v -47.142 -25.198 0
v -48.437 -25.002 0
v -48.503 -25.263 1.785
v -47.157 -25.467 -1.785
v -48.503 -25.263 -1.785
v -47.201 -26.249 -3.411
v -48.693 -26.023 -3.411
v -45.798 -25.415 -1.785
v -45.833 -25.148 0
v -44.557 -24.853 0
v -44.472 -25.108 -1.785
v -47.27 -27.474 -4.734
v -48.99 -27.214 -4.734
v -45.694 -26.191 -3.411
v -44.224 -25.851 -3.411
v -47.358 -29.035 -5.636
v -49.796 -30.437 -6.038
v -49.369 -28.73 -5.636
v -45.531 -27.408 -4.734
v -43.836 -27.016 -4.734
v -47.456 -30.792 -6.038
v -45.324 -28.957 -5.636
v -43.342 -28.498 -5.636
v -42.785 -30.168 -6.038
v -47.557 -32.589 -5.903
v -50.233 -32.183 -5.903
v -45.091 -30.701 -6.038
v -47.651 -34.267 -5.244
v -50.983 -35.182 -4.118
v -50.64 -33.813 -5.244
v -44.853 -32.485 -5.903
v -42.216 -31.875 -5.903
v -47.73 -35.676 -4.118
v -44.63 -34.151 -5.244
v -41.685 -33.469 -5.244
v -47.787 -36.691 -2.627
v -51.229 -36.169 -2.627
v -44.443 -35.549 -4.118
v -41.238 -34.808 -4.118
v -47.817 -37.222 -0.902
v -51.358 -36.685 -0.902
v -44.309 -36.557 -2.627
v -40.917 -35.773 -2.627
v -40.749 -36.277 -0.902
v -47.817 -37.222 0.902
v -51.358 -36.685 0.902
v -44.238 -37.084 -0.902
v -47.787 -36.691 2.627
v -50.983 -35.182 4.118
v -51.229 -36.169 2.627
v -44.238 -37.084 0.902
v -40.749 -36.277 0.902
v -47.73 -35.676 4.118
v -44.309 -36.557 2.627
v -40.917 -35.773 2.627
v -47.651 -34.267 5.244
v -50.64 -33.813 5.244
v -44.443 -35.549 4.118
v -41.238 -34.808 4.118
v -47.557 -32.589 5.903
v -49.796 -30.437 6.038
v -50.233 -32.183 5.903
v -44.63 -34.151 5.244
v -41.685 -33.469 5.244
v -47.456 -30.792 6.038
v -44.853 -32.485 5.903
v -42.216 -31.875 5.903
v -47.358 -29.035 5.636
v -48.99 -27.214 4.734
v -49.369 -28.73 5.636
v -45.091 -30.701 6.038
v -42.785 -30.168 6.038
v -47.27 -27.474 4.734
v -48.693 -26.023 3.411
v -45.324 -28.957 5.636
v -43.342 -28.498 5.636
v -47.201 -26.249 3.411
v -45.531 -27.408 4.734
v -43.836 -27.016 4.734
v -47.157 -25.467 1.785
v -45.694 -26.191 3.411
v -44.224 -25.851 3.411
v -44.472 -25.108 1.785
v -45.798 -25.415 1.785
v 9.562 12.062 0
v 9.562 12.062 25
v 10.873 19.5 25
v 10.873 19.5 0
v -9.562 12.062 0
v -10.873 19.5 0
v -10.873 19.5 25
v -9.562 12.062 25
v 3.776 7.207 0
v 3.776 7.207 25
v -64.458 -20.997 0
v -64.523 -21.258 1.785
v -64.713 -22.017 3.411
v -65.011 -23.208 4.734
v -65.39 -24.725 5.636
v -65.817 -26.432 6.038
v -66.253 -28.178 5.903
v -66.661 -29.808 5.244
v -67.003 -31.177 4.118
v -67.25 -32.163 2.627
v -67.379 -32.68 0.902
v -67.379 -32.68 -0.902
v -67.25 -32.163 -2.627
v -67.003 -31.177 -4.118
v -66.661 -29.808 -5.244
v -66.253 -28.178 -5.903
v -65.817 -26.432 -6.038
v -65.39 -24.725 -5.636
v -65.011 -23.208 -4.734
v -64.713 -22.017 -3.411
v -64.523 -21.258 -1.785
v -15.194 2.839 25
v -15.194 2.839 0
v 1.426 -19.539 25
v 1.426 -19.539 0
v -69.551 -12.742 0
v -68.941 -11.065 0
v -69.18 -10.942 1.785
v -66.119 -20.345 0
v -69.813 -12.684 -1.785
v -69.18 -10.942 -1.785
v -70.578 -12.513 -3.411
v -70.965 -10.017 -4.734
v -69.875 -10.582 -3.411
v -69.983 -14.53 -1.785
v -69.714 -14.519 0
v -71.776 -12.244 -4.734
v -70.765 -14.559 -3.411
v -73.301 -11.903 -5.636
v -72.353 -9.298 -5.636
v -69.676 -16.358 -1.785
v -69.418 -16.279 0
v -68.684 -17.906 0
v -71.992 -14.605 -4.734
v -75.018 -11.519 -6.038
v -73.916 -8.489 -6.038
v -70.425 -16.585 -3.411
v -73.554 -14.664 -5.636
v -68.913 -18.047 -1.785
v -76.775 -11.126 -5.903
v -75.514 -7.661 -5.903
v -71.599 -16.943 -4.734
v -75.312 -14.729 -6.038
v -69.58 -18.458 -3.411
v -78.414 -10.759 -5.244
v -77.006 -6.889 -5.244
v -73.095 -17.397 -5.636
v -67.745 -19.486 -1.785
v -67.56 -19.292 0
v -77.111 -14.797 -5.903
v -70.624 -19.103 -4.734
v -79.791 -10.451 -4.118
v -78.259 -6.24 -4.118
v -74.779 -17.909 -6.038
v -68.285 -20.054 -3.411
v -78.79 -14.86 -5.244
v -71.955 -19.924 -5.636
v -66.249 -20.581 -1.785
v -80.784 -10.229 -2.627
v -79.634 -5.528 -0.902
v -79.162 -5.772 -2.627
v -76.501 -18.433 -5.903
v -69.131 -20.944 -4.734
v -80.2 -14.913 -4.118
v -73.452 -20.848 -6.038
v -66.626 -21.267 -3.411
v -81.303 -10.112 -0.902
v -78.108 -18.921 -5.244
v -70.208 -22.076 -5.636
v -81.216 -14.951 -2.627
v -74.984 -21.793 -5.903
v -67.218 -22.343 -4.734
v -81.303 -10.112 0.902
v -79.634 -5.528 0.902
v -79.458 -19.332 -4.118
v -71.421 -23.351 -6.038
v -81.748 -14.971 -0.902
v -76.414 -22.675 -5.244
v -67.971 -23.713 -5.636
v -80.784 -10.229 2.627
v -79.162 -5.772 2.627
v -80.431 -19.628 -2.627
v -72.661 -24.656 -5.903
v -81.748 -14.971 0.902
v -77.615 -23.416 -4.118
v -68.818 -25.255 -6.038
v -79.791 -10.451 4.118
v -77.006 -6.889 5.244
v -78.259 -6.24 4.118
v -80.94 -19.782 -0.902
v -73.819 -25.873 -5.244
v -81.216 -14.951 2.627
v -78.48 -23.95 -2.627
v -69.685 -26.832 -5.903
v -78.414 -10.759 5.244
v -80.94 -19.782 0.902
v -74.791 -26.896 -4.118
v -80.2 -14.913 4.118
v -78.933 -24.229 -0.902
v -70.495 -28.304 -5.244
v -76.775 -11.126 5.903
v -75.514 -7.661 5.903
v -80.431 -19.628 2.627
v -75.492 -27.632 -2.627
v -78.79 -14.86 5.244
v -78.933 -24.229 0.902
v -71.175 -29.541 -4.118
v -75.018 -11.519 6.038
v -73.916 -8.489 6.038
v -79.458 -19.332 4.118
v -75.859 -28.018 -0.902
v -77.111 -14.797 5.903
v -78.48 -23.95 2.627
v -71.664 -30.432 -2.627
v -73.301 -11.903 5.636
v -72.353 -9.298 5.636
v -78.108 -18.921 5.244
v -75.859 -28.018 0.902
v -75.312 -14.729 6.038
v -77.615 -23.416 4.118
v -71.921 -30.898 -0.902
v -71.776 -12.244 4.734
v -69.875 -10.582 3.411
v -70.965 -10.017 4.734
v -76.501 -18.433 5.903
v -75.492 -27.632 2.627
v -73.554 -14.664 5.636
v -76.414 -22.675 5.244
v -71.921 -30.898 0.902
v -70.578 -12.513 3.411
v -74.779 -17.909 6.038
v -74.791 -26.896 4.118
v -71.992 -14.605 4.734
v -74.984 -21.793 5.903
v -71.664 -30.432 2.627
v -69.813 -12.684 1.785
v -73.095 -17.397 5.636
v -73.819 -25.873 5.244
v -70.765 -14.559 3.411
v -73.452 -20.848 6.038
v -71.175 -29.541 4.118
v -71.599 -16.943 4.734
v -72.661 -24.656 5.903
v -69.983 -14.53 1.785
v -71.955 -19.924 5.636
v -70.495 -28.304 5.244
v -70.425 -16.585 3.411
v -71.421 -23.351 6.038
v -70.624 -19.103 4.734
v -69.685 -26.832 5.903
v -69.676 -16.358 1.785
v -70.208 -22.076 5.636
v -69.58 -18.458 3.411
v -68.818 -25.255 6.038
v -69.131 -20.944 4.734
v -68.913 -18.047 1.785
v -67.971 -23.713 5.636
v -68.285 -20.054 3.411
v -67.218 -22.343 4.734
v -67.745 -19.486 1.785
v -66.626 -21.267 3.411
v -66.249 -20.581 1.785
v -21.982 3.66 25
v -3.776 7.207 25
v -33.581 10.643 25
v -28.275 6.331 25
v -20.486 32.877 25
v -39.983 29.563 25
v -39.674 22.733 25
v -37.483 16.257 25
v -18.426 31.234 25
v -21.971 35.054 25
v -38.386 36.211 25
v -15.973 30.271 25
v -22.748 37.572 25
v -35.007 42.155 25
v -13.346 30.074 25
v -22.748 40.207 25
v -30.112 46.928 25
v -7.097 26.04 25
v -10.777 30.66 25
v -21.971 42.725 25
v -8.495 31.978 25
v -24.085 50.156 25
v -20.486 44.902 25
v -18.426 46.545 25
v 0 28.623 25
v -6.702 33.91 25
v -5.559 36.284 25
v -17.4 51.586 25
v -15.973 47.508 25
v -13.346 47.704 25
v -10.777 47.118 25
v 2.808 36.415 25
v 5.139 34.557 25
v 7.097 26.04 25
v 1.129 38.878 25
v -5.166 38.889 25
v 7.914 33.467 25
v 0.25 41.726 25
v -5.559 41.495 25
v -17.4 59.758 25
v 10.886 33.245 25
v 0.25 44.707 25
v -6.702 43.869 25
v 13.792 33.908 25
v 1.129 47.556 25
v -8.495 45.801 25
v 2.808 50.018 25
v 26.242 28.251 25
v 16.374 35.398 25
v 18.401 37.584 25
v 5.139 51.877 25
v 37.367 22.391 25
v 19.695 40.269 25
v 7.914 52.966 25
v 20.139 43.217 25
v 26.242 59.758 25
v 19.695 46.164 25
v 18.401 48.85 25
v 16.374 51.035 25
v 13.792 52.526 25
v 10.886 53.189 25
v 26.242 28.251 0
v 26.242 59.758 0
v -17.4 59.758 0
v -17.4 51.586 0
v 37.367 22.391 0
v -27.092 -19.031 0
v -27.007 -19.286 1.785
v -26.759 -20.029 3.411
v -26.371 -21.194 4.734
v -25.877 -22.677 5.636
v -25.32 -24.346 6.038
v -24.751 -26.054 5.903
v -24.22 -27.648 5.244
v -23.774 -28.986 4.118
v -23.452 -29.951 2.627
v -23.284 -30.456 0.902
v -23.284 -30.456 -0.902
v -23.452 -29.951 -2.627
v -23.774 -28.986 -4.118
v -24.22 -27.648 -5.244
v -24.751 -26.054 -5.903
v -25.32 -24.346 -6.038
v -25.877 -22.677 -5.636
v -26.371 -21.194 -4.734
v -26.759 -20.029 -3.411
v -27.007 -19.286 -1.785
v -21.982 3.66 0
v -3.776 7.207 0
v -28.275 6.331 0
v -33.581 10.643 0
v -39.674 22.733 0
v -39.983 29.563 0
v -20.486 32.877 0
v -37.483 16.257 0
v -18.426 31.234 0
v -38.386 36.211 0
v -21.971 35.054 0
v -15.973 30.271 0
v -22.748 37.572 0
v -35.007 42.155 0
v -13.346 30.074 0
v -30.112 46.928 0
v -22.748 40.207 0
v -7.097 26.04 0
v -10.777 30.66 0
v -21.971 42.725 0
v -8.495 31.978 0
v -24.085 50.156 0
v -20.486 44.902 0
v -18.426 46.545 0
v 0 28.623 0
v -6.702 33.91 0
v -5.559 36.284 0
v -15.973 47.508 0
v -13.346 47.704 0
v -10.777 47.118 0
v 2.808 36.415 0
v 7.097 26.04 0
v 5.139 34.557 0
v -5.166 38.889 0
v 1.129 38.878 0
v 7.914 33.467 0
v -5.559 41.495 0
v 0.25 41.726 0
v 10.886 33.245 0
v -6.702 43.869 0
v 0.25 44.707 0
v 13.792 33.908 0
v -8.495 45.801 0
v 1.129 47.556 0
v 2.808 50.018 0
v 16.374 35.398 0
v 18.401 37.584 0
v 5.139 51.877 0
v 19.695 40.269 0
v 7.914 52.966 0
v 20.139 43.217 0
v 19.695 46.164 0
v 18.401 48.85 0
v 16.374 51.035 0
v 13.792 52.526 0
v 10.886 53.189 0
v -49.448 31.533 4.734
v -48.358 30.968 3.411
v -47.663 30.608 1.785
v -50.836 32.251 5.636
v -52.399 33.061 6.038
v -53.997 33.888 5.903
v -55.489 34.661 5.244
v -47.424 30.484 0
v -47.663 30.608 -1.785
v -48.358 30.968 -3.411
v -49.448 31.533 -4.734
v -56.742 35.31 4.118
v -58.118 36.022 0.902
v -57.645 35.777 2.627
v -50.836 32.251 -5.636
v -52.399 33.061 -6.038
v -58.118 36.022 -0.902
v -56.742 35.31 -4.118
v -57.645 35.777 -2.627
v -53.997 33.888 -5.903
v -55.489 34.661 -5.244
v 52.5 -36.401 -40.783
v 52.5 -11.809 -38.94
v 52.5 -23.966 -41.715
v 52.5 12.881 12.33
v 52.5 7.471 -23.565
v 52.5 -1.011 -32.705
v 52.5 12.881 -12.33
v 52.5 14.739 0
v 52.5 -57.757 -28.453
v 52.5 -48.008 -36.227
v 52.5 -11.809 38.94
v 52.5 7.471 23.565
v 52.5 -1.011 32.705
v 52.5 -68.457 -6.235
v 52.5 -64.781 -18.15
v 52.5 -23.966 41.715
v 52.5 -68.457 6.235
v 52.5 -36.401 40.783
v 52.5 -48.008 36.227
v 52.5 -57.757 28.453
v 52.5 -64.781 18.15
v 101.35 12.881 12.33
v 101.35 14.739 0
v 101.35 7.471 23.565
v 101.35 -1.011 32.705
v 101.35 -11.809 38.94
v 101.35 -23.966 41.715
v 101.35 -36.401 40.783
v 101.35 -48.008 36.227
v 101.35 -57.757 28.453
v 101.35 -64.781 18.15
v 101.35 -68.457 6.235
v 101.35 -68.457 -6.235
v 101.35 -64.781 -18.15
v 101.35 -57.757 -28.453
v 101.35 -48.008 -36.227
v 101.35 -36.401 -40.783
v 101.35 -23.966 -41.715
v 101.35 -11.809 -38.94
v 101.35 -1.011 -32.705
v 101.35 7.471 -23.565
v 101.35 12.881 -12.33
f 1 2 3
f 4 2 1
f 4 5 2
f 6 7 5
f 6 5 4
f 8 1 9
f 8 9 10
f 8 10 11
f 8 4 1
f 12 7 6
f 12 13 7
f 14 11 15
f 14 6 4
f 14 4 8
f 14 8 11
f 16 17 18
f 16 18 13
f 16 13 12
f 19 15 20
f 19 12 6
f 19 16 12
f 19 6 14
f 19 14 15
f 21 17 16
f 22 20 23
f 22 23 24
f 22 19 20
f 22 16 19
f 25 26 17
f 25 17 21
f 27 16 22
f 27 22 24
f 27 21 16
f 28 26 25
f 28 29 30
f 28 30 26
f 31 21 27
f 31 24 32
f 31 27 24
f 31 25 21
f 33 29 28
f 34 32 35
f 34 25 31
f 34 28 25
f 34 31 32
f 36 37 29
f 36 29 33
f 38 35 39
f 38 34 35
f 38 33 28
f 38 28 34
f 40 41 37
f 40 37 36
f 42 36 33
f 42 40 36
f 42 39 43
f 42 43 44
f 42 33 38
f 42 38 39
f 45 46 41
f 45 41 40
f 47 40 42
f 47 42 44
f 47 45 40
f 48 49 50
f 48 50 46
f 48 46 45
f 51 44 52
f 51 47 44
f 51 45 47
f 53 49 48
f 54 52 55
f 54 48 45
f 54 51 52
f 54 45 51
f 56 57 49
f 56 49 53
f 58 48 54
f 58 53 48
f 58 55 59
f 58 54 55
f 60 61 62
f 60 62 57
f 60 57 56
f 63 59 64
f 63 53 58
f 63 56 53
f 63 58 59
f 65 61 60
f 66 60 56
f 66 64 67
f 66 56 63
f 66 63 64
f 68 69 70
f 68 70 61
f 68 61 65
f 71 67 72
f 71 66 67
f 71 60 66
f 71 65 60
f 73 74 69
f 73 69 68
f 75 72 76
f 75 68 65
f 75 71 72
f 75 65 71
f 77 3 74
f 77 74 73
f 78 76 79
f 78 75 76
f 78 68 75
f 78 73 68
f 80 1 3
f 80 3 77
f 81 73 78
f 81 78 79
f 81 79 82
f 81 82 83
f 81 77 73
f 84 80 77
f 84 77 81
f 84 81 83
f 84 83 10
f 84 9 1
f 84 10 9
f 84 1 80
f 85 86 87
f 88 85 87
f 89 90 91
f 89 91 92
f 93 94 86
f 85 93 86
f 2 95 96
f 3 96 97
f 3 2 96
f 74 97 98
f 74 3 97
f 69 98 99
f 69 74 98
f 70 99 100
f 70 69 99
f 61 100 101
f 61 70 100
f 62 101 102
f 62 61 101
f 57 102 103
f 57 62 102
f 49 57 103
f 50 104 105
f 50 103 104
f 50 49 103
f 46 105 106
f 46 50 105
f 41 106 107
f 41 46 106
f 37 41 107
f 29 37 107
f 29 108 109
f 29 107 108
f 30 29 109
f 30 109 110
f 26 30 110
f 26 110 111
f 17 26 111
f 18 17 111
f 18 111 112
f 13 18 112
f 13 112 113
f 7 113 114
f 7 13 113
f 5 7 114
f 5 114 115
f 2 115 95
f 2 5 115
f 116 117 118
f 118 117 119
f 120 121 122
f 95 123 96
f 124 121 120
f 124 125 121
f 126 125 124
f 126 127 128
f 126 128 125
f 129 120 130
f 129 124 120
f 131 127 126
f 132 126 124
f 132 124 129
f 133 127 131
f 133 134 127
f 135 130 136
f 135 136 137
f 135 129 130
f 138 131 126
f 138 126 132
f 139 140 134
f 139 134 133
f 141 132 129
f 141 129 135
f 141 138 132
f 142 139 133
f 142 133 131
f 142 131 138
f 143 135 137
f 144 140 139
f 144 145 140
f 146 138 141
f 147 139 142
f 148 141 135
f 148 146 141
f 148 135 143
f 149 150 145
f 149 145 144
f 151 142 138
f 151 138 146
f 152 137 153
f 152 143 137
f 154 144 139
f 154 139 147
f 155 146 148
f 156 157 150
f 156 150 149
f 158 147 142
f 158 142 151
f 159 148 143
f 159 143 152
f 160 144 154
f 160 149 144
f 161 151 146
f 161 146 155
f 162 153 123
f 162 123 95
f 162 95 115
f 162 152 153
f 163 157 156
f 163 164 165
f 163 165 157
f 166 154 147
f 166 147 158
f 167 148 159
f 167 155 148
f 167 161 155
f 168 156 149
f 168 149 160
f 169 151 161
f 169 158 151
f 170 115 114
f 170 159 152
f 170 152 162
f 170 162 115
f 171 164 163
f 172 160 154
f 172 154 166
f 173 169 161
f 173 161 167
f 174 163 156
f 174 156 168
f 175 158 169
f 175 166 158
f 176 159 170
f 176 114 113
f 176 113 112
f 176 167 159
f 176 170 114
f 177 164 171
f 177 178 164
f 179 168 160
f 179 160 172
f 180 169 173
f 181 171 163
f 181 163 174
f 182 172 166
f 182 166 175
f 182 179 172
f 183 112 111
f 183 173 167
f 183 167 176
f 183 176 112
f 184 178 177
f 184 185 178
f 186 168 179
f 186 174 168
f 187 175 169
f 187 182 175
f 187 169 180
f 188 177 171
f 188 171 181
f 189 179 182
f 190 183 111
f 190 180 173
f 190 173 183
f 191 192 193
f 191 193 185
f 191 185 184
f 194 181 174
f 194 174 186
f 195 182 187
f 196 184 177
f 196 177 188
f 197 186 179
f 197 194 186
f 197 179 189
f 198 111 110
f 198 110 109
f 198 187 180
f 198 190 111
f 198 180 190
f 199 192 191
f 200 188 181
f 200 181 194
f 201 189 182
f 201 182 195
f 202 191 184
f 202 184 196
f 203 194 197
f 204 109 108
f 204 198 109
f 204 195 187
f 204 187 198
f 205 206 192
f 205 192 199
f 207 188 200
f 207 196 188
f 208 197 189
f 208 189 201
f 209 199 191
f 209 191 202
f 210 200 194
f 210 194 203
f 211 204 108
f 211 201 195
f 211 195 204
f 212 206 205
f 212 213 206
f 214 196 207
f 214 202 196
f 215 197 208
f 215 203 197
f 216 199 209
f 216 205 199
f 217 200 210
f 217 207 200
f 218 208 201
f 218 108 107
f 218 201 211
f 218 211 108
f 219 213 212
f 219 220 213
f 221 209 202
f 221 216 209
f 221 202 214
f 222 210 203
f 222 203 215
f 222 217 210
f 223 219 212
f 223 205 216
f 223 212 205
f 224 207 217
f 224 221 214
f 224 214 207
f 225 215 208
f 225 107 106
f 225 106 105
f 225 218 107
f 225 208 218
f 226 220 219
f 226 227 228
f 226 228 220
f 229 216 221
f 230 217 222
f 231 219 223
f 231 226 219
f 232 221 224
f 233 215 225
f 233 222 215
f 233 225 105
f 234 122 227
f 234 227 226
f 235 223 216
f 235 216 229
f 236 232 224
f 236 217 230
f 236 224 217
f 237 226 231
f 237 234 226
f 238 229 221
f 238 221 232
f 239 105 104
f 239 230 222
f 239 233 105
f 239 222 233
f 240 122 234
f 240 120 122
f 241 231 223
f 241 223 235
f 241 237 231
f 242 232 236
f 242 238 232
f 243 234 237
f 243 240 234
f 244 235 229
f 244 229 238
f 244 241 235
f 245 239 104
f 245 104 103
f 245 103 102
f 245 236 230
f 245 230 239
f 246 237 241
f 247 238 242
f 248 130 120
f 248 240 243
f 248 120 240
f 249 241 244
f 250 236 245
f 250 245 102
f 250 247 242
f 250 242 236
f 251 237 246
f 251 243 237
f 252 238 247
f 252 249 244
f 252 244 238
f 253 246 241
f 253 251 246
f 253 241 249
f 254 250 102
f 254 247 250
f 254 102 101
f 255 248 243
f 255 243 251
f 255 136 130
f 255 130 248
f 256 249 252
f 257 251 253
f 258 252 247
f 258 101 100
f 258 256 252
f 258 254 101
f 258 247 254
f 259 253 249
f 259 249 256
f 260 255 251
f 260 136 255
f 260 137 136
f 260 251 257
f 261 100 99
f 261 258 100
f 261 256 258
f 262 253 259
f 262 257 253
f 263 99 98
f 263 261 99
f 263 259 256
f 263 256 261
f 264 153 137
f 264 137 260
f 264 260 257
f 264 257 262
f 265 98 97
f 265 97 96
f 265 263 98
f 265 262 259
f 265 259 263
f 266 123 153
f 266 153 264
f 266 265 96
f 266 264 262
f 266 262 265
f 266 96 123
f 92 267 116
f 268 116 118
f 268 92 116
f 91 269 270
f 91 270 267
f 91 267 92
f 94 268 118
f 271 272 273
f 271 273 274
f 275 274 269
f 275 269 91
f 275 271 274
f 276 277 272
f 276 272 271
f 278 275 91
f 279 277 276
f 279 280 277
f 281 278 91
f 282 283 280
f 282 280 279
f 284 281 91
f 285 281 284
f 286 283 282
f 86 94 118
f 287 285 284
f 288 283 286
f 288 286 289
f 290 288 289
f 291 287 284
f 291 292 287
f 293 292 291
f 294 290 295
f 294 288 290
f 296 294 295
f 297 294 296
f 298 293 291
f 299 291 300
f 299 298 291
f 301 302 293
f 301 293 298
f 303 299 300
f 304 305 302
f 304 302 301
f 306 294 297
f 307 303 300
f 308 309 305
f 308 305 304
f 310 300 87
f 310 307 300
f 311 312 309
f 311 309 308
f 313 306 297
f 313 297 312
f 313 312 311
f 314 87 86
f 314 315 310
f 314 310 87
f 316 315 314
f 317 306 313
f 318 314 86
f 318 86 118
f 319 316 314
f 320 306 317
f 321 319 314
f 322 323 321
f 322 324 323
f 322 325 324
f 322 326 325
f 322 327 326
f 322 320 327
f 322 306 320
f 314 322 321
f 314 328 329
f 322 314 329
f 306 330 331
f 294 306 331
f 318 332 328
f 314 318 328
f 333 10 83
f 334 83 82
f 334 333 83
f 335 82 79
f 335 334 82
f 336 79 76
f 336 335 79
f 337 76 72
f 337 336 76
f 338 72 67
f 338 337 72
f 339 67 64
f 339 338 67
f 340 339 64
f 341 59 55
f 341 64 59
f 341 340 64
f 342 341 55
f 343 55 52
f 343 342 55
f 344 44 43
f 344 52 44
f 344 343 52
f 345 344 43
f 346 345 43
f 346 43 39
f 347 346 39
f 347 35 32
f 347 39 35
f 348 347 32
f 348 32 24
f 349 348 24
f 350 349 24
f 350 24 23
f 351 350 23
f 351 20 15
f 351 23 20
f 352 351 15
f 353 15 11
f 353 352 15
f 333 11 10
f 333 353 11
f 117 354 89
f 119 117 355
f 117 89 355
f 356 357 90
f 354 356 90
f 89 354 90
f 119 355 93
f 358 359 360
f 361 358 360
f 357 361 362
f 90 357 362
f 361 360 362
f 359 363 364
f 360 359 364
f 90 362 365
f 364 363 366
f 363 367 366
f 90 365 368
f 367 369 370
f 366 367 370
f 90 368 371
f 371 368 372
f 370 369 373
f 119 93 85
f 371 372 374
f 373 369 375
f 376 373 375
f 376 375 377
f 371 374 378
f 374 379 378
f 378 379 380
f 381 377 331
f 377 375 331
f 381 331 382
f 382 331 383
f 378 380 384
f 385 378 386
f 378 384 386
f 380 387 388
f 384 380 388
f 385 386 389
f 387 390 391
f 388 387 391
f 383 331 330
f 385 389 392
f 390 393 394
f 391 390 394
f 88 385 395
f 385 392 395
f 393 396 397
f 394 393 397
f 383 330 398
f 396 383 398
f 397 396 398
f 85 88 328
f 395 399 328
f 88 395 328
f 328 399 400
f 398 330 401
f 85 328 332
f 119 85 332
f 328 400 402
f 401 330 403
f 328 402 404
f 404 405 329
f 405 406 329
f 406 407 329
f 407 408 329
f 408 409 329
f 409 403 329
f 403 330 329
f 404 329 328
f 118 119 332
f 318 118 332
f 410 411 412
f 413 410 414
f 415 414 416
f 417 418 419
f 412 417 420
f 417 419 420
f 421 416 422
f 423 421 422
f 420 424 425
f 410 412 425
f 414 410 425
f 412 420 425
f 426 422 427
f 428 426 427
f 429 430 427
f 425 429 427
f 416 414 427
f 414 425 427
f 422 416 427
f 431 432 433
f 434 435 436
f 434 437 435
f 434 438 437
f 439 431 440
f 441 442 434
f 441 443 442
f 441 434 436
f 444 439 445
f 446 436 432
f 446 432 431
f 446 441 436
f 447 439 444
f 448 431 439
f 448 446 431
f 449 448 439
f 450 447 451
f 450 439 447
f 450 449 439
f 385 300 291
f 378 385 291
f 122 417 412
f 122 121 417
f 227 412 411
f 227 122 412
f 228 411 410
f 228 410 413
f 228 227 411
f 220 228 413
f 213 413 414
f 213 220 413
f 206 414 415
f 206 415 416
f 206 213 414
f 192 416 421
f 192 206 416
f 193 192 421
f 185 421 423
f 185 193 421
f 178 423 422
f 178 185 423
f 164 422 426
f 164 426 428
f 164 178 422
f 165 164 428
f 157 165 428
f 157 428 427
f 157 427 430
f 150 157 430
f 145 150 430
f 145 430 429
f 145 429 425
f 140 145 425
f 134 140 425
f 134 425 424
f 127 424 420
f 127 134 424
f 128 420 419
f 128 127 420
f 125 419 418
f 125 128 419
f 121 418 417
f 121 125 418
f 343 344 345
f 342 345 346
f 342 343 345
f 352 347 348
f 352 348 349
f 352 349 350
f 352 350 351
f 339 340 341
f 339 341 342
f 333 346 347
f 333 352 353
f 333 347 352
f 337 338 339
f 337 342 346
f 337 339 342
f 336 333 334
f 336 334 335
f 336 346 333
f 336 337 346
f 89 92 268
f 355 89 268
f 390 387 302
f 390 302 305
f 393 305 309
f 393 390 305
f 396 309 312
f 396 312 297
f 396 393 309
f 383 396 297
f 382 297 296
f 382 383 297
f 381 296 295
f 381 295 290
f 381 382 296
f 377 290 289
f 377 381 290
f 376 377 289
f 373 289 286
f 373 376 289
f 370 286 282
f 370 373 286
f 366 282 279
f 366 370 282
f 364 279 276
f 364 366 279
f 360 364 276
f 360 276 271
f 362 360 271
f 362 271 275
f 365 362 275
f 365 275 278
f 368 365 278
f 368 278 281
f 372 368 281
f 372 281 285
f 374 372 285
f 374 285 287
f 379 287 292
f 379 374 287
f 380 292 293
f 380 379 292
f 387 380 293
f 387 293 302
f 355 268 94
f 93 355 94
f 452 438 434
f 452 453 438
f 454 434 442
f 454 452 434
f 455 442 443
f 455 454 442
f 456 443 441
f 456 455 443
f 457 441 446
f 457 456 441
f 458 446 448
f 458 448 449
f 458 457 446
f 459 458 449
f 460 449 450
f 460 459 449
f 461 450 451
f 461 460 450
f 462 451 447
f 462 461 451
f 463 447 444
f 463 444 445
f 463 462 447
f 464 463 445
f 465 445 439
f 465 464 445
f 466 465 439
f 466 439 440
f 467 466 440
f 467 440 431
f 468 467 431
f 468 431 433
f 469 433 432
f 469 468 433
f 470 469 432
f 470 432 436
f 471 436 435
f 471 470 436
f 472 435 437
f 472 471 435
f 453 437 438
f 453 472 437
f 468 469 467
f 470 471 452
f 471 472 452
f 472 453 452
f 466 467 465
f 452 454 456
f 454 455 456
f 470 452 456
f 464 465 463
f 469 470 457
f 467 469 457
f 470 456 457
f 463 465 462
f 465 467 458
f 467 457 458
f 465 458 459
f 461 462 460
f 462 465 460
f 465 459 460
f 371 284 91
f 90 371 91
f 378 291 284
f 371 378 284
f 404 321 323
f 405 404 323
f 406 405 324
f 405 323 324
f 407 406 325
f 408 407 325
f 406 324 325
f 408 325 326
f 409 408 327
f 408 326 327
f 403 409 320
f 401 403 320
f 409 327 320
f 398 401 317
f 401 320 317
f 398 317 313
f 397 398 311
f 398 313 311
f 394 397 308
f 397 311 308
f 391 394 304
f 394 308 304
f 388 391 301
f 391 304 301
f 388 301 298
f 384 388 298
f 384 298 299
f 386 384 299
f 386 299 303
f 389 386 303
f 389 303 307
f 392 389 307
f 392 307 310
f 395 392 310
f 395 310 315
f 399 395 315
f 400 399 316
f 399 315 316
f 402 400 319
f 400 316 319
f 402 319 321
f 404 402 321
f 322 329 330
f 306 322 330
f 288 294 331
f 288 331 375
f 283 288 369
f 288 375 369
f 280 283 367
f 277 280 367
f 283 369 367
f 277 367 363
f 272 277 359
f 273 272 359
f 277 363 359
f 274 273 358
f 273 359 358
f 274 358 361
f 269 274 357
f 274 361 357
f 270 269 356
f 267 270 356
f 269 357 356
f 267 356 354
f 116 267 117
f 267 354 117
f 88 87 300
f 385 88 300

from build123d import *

# Parameters (mm, degrees)
F0_R      = 8.8399047294
F1_DEPTH  = 25
F2_R      = 10
F3_DEPTH  = 25
F4_W      = 48.8502793014
F4_H      = 41.8315539137
F8_R      = 6.0550618463
F10_DEPTH = 25


with BuildPart() as f1:
    # F0 (on Top) → F1 (new body)
    with BuildSketch(Plane.XY):
        with BuildLine():
            Line((37.3665243387, 22.3913900554), (26.2421369553, 28.2508008051))
            Line((26.2421369553, 28.2508008051), (26.2421369553, 59.7579181194))
            Line((26.2421369553, 59.7579181194), (-17.3996798694, 59.7579181194))
            Line((-17.3996798694, 59.7579181194), (-17.3996798694, 51.5863984335))
            ThreePointArc((-17.3996798694, 51.5863984335), (-40.0692905426, 26.1373309643), (-15.1940669074, 2.8394870249))
            Line((-15.1940669074, 2.8394870249), (1.4262011973, -19.5389837027))
            Line((1.4262011973, -19.5389837027), (37.3665243387, 22.3913900554))
        make_face()
        with Locations((-14.0063641593, 38.8893075287)):
            Circle(F0_R, mode=Mode.SUBTRACT)
    extrude(amount=F1_DEPTH)

    # F2 (on face) → F3 (cut)
    with BuildSketch(Plane.XY.offset(25)):
        Polygon((-3.7761976468, 7.2072981857), (3.7761976468, 7.2072981857), (9.5616680936, 12.0618843038), (10.8731277734, 19.4995417427), (7.0969301266, 26.0401079264), (0, 28.6231792471), (-7.0969301266, 26.0401079264), (-10.8731277734, 19.4995417427), (-9.5616680936, 12.0618843038), align=None)
        with Locations((10.1387892751, 43.2167700854)):
            Circle(F2_R)
    extrude(amount=-F3_DEPTH, mode=Mode.SUBTRACT)


with BuildPart() as f5:
    # F4 (on Top) → F5 (revolve)
    with BuildSketch(Plane.XY):
        with Locations((76.9251380116, -6.1764712445)):
            Rectangle(F4_W, F4_H)
    revolve(axis=Axis((76.9251380116, -27.0922482014, 0), (1, 0, 0)))


with BuildPart() as f9:
    # F9: sweep along a path in F6
    with BuildLine(Plane.XY) as f9_path:
        Line((-52.8008006513, 33.2687199116), (-74.3176116033, -8.2809805443))
        ThreePointArc((-74.3176116033, -8.2809805443), (-74.6225780717, -19.6073308005), (-65.926647183, -26.8709387643))
        Line((-65.926647183, -26.8709387643), (-49.9059681609, -30.8761079422))
        ThreePointArc((-49.9059681609, -30.8761079422), (-46.2541109203, -31.254678892), (-42.6420453234, -30.5971384807))
        Line((-42.6420453234, -30.5971384807), (-25.1772358201, -24.7755366004))
    # F8 (on line) → F9 (sweep)
    with BuildSketch(Plane(origin=(2.4196440939, 4.6724157931, 0), x_dir=(0.8879943937, -0.4598542778, 0), z_dir=(-0.4598542778, -0.8879943937, 0))):
        with Locations((-62.1855781278, 0)):
            Circle(F8_R)
    sweep(path=f9_path.line)

    # F8 (on line) → F10 (join)
    with BuildSketch(Plane(origin=(2.4196440939, 4.6724157931, 0), x_dir=(0.8879943937, -0.4598542778, 0), z_dir=(-0.4598542778, -0.8879943937, 0))):
        with Locations((-62.1855781278, 0)):
            Circle(F8_R)
    extrude(amount=F10_DEPTH)


solid = Compound([f1.part, f5.part, f9.part])
